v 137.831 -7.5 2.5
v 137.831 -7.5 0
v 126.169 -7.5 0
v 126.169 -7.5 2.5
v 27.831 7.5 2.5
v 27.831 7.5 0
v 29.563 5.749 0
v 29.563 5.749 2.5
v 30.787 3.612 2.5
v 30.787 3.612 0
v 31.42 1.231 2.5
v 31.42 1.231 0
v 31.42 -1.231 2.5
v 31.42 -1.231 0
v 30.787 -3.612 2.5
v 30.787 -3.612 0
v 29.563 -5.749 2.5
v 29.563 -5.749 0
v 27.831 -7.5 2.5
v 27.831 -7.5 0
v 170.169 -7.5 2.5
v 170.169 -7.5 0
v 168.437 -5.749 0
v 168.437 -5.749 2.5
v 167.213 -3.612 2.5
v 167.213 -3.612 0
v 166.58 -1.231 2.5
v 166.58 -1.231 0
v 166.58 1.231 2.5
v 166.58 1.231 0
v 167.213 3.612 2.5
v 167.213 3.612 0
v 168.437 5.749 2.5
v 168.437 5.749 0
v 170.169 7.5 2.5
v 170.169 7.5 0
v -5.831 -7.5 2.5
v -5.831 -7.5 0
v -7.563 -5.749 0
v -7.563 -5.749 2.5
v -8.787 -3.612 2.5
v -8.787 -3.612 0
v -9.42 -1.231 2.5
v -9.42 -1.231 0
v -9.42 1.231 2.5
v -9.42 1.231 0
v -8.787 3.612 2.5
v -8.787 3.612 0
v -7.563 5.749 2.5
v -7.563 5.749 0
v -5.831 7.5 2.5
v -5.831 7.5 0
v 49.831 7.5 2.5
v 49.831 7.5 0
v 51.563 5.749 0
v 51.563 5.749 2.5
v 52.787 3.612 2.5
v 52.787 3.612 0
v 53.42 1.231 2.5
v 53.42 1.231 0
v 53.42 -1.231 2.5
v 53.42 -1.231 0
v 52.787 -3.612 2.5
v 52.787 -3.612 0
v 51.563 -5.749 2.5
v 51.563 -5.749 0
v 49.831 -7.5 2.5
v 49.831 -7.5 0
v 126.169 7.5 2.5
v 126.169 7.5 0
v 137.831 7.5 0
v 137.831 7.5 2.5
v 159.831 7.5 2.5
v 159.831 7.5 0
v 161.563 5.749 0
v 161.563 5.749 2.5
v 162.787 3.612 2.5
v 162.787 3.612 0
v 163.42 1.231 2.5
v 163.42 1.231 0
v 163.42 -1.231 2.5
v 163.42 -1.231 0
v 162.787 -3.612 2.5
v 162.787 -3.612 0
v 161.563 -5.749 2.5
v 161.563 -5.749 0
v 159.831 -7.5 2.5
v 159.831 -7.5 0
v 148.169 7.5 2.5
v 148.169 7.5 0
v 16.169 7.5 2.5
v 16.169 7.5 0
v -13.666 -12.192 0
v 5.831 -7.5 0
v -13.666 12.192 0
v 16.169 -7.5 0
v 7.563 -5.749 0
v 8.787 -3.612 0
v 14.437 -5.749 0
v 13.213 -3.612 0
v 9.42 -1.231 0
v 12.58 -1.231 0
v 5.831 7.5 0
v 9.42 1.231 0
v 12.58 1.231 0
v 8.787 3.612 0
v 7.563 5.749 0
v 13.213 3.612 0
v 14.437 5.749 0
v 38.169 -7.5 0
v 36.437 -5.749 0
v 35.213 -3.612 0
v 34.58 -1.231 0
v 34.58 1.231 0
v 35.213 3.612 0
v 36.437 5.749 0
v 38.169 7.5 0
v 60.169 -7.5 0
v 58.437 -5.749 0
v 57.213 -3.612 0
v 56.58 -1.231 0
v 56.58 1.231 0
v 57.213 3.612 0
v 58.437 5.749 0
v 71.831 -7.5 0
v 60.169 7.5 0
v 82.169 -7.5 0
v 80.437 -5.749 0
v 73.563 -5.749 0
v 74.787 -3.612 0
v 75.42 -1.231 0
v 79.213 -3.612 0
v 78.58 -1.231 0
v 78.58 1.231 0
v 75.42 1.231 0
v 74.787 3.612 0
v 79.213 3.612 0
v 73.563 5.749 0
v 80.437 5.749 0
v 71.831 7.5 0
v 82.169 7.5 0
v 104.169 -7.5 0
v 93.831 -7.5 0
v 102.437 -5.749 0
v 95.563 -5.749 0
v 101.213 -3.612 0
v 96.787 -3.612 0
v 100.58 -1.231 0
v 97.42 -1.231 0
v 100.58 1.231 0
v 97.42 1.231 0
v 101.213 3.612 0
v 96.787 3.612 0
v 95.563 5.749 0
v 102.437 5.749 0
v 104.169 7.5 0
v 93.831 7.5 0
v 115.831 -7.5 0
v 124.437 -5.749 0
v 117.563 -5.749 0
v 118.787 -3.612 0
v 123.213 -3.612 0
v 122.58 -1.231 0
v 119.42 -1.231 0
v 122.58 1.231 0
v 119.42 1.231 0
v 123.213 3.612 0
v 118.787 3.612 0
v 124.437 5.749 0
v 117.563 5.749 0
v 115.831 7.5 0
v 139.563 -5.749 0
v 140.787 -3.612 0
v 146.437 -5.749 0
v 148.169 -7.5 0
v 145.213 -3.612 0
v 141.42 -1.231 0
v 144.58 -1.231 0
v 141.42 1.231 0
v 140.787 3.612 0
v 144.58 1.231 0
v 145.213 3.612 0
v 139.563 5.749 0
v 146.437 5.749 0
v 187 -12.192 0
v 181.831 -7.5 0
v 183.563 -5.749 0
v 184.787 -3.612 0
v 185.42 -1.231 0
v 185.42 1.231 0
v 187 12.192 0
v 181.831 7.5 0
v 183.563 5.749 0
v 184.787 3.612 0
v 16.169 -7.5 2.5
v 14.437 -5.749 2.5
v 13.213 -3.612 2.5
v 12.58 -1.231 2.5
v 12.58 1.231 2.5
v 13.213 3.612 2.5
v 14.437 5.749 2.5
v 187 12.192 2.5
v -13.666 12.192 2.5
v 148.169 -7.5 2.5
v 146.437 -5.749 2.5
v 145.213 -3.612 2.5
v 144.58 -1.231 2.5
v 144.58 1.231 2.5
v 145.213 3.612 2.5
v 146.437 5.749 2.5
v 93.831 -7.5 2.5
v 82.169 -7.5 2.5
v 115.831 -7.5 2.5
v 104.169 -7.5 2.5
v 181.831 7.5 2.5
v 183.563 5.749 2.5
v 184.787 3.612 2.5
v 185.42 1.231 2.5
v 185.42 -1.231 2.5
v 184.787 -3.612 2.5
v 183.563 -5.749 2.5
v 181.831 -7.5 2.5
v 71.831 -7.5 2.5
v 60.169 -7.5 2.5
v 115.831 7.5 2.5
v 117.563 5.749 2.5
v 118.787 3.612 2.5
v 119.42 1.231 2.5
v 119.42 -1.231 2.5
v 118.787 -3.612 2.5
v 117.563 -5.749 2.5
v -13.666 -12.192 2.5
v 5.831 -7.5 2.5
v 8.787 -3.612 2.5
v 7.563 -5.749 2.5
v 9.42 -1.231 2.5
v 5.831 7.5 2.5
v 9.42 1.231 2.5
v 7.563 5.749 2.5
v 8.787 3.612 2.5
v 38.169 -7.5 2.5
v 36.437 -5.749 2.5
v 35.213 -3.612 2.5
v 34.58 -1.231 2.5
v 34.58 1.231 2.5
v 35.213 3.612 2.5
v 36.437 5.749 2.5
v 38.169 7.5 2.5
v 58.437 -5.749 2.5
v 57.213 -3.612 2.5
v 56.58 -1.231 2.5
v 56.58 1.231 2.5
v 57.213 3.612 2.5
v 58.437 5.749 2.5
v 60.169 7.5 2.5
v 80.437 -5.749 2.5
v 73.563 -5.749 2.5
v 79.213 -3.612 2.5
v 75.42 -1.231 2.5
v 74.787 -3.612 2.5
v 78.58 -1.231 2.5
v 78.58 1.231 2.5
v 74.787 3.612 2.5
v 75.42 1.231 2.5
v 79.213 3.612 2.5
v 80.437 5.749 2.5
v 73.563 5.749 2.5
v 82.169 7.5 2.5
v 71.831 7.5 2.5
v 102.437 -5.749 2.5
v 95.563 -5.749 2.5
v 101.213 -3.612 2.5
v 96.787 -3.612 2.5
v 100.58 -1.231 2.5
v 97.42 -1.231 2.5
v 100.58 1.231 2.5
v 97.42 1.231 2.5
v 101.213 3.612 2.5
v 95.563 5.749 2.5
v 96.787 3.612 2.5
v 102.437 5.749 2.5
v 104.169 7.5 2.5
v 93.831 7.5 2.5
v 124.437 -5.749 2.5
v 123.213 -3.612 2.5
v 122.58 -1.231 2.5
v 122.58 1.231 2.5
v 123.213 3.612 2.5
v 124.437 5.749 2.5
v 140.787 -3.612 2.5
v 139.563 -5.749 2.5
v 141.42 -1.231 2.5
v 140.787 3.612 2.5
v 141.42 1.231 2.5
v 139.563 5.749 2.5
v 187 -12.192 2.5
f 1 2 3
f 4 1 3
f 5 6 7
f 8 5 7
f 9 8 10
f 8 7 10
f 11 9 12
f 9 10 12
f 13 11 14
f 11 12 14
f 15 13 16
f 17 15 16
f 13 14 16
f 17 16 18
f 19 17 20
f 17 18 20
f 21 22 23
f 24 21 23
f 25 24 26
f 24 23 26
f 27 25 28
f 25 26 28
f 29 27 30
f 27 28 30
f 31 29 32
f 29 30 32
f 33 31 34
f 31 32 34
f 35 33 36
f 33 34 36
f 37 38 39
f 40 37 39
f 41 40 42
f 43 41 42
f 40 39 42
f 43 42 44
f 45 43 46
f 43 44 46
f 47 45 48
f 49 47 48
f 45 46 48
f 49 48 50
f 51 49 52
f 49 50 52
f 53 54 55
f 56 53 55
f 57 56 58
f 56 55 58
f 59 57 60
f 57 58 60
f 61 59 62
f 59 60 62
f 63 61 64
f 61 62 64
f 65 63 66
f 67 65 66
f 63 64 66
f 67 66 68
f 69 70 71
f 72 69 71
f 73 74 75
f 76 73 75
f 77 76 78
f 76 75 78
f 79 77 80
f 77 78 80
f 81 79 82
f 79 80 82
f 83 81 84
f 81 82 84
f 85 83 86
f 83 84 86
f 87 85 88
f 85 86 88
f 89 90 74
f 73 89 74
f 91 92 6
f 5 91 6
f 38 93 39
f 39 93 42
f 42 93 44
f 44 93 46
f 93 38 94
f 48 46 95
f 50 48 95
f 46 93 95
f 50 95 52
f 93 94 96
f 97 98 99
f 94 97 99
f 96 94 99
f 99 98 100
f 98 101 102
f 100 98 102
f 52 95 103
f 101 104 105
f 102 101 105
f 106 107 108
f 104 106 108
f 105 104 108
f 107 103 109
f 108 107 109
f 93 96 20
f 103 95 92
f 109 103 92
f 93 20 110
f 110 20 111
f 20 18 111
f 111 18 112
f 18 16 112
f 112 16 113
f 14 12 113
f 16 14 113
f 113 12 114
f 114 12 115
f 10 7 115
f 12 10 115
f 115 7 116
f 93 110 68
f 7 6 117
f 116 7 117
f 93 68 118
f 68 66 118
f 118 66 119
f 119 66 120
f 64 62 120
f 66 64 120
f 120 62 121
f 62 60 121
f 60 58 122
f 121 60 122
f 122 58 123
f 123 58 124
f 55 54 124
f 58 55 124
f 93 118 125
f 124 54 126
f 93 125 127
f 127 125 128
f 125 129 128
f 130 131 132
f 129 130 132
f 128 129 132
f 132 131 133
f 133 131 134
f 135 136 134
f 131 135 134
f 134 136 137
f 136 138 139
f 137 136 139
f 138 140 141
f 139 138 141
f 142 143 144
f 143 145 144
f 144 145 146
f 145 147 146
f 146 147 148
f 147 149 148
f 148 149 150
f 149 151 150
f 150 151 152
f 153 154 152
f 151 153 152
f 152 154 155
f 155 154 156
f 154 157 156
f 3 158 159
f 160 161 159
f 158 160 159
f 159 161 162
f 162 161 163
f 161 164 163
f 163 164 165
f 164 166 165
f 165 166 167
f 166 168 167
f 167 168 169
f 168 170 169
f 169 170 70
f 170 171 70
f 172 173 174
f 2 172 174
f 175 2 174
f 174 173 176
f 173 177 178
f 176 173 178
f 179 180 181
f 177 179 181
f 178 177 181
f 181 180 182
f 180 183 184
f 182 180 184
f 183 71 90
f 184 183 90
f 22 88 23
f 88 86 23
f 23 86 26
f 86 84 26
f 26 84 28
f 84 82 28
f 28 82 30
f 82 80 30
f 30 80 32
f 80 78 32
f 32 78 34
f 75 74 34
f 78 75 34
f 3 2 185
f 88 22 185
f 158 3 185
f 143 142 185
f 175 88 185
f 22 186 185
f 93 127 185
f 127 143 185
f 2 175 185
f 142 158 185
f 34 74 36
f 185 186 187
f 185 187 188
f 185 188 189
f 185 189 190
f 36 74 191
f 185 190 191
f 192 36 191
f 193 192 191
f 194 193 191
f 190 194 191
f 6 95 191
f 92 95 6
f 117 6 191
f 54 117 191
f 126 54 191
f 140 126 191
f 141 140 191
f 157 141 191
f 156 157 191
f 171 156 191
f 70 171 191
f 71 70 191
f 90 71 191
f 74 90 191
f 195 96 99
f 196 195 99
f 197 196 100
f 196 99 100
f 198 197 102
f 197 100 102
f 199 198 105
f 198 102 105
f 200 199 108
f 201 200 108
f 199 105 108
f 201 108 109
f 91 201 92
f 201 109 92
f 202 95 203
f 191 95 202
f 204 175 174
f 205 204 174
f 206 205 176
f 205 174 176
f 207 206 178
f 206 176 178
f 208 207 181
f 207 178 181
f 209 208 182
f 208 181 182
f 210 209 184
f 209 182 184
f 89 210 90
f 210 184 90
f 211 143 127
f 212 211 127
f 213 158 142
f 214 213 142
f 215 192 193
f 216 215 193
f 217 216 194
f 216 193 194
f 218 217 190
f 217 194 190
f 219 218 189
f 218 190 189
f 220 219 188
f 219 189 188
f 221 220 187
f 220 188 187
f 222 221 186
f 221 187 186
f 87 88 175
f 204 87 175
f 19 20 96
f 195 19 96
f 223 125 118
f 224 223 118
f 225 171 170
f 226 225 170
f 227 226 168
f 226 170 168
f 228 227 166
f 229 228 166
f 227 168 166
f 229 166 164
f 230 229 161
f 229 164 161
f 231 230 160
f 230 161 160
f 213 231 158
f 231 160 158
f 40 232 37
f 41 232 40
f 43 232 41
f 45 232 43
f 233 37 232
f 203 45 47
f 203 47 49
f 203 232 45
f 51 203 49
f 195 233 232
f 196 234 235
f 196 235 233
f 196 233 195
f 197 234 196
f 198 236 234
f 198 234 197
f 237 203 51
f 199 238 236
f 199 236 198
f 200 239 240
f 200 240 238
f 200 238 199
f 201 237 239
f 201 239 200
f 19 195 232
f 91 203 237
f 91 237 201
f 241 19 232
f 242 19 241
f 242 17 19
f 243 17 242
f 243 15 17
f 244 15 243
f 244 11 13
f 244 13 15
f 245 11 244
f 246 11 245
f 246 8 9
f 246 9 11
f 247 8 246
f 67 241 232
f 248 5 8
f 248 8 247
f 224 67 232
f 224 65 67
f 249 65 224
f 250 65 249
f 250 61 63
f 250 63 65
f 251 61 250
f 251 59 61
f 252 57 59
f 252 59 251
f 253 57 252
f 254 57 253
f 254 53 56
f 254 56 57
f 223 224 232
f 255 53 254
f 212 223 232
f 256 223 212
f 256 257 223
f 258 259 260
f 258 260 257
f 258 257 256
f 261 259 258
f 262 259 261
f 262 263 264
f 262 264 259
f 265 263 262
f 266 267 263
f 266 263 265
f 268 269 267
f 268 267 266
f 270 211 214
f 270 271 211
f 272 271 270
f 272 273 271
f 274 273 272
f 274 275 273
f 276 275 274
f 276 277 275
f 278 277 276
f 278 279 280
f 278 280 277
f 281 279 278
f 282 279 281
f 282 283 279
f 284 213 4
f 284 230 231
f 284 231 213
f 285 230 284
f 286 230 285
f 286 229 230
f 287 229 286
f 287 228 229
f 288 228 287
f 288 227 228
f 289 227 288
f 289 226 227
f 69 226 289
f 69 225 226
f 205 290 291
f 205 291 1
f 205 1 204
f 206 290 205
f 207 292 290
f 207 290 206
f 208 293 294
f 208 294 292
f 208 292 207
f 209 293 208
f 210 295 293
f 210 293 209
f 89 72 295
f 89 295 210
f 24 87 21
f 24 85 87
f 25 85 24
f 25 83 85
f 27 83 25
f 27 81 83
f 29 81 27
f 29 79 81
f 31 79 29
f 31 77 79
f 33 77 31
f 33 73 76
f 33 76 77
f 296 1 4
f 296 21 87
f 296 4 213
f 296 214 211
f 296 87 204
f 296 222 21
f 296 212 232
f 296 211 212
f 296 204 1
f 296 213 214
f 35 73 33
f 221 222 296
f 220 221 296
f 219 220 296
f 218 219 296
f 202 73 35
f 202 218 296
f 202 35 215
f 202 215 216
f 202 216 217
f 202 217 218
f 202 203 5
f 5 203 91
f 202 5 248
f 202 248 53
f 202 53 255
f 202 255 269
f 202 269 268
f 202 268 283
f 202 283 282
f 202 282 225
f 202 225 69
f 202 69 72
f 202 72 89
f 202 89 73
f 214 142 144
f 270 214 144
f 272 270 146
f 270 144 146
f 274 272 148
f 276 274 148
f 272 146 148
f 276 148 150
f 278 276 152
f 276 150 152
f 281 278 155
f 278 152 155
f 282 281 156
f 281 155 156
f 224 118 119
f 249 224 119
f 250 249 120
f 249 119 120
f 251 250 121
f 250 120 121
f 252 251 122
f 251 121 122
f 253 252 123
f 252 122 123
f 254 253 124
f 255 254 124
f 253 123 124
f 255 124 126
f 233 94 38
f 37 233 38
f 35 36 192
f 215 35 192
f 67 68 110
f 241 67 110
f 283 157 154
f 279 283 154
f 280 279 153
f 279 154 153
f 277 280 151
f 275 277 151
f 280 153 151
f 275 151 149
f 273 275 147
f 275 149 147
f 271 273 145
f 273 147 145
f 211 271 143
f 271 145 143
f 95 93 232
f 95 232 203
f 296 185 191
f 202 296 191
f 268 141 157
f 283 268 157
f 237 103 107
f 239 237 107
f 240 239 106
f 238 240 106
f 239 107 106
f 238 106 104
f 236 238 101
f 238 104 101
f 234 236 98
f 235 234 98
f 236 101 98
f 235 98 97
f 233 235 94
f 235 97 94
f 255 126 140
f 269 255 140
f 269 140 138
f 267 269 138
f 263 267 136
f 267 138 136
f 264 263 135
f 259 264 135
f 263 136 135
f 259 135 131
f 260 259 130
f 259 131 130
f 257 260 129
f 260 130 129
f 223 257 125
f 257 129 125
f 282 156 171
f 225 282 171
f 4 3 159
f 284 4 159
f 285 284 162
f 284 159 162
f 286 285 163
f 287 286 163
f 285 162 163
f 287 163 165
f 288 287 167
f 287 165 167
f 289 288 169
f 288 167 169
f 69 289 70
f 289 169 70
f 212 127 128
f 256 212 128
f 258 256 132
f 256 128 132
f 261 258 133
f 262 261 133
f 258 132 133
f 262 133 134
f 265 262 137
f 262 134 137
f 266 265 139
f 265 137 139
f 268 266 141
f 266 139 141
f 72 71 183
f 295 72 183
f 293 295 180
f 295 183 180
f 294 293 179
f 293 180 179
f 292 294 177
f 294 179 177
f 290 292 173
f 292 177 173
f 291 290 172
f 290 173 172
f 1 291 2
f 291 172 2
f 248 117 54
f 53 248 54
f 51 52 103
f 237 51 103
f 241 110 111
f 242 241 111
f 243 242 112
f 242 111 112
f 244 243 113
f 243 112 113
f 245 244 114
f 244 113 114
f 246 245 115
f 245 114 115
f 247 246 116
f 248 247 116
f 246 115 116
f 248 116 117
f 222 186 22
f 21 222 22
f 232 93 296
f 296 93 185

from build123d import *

# Parameters (mm, degrees)
F0_W     = 200.665613
F0_H     = 24.384
F1_DEPTH = 2.5


with BuildPart() as f1:
    # F0 (on Top) → F1 (new body)
    with BuildSketch(Plane.XY):
        with Locations((86.667197, 0)):
            Rectangle(F0_W, F0_H)
        with BuildLine():
            ThreePointArc((-5.830952, -7.5), (-9.5, 0), (-5.830952, 7.5))
            Line((-5.830952, 7.5), (5.830952, 7.5))
            ThreePointArc((5.830952, 7.5), (9.5, 0), (5.830952, -7.5))
            Line((5.830952, -7.5), (-5.830952, -7.5))
        make_face(mode=Mode.SUBTRACT)
        with BuildLine():
            ThreePointArc((16.169048, -7.5), (12.5, 0), (16.169048, 7.5))
            Line((16.169048, 7.5), (27.830952, 7.5))
            ThreePointArc((27.830952, 7.5), (31.5, 0), (27.830952, -7.5))
            Line((27.830952, -7.5), (16.169048, -7.5))
        make_face(mode=Mode.SUBTRACT)
        with BuildLine():
            ThreePointArc((38.169048, -7.5), (34.5, 0), (38.169048, 7.5))
            Line((38.169048, 7.5), (49.830952, 7.5))
            ThreePointArc((49.830952, 7.5), (53.5, 0), (49.830952, -7.5))
            Line((49.830952, -7.5), (38.169048, -7.5))
        make_face(mode=Mode.SUBTRACT)
        with BuildLine():
            ThreePointArc((60.169048, -7.5), (56.5, 0), (60.169048, 7.5))
            Line((60.169048, 7.5), (71.830952, 7.5))
            ThreePointArc((71.830952, 7.5), (75.5, 0), (71.830952, -7.5))
            Line((71.830952, -7.5), (60.169048, -7.5))
        make_face(mode=Mode.SUBTRACT)
        with BuildLine():
            ThreePointArc((82.169048, -7.5), (78.5, 0), (82.169048, 7.5))
            Line((82.169048, 7.5), (93.830952, 7.5))
            ThreePointArc((93.830952, 7.5), (97.5, 0), (93.830952, -7.5))
            Line((93.830952, -7.5), (82.169048, -7.5))
        make_face(mode=Mode.SUBTRACT)
        with BuildLine():
            ThreePointArc((104.169048, -7.5), (100.5, 0), (104.169048, 7.5))
            Line((104.169048, 7.5), (115.830952, 7.5))
            ThreePointArc((115.830952, 7.5), (119.5, 0), (115.830952, -7.5))
            Line((115.830952, -7.5), (104.169048, -7.5))
        make_face(mode=Mode.SUBTRACT)
        with BuildLine():
            ThreePointArc((126.169048, -7.5), (122.5, 0), (126.169048, 7.5))
            Line((126.169048, 7.5), (137.830952, 7.5))
            ThreePointArc((137.830952, 7.5), (141.5, 0), (137.830952, -7.5))
            Line((137.830952, -7.5), (126.169048, -7.5))
        make_face(mode=Mode.SUBTRACT)
        with BuildLine():
            ThreePointArc((148.169048, -7.5), (144.5, 0), (148.169048, 7.5))
            Line((148.169048, 7.5), (159.830952, 7.5))
            ThreePointArc((159.830952, 7.5), (163.5, 0), (159.830952, -7.5))
            Line((159.830952, -7.5), (148.169048, -7.5))
        make_face(mode=Mode.SUBTRACT)
        with BuildLine():
            ThreePointArc((170.169048, -7.5), (166.5, 0), (170.169048, 7.5))
            Line((170.169048, 7.5), (181.830952, 7.5))
            ThreePointArc((181.830952, 7.5), (185.5, 0), (181.830952, -7.5))
            Line((181.830952, -7.5), (170.169048, -7.5))
        make_face(mode=Mode.SUBTRACT)
    extrude(amount=F1_DEPTH)


solid = f1.part
